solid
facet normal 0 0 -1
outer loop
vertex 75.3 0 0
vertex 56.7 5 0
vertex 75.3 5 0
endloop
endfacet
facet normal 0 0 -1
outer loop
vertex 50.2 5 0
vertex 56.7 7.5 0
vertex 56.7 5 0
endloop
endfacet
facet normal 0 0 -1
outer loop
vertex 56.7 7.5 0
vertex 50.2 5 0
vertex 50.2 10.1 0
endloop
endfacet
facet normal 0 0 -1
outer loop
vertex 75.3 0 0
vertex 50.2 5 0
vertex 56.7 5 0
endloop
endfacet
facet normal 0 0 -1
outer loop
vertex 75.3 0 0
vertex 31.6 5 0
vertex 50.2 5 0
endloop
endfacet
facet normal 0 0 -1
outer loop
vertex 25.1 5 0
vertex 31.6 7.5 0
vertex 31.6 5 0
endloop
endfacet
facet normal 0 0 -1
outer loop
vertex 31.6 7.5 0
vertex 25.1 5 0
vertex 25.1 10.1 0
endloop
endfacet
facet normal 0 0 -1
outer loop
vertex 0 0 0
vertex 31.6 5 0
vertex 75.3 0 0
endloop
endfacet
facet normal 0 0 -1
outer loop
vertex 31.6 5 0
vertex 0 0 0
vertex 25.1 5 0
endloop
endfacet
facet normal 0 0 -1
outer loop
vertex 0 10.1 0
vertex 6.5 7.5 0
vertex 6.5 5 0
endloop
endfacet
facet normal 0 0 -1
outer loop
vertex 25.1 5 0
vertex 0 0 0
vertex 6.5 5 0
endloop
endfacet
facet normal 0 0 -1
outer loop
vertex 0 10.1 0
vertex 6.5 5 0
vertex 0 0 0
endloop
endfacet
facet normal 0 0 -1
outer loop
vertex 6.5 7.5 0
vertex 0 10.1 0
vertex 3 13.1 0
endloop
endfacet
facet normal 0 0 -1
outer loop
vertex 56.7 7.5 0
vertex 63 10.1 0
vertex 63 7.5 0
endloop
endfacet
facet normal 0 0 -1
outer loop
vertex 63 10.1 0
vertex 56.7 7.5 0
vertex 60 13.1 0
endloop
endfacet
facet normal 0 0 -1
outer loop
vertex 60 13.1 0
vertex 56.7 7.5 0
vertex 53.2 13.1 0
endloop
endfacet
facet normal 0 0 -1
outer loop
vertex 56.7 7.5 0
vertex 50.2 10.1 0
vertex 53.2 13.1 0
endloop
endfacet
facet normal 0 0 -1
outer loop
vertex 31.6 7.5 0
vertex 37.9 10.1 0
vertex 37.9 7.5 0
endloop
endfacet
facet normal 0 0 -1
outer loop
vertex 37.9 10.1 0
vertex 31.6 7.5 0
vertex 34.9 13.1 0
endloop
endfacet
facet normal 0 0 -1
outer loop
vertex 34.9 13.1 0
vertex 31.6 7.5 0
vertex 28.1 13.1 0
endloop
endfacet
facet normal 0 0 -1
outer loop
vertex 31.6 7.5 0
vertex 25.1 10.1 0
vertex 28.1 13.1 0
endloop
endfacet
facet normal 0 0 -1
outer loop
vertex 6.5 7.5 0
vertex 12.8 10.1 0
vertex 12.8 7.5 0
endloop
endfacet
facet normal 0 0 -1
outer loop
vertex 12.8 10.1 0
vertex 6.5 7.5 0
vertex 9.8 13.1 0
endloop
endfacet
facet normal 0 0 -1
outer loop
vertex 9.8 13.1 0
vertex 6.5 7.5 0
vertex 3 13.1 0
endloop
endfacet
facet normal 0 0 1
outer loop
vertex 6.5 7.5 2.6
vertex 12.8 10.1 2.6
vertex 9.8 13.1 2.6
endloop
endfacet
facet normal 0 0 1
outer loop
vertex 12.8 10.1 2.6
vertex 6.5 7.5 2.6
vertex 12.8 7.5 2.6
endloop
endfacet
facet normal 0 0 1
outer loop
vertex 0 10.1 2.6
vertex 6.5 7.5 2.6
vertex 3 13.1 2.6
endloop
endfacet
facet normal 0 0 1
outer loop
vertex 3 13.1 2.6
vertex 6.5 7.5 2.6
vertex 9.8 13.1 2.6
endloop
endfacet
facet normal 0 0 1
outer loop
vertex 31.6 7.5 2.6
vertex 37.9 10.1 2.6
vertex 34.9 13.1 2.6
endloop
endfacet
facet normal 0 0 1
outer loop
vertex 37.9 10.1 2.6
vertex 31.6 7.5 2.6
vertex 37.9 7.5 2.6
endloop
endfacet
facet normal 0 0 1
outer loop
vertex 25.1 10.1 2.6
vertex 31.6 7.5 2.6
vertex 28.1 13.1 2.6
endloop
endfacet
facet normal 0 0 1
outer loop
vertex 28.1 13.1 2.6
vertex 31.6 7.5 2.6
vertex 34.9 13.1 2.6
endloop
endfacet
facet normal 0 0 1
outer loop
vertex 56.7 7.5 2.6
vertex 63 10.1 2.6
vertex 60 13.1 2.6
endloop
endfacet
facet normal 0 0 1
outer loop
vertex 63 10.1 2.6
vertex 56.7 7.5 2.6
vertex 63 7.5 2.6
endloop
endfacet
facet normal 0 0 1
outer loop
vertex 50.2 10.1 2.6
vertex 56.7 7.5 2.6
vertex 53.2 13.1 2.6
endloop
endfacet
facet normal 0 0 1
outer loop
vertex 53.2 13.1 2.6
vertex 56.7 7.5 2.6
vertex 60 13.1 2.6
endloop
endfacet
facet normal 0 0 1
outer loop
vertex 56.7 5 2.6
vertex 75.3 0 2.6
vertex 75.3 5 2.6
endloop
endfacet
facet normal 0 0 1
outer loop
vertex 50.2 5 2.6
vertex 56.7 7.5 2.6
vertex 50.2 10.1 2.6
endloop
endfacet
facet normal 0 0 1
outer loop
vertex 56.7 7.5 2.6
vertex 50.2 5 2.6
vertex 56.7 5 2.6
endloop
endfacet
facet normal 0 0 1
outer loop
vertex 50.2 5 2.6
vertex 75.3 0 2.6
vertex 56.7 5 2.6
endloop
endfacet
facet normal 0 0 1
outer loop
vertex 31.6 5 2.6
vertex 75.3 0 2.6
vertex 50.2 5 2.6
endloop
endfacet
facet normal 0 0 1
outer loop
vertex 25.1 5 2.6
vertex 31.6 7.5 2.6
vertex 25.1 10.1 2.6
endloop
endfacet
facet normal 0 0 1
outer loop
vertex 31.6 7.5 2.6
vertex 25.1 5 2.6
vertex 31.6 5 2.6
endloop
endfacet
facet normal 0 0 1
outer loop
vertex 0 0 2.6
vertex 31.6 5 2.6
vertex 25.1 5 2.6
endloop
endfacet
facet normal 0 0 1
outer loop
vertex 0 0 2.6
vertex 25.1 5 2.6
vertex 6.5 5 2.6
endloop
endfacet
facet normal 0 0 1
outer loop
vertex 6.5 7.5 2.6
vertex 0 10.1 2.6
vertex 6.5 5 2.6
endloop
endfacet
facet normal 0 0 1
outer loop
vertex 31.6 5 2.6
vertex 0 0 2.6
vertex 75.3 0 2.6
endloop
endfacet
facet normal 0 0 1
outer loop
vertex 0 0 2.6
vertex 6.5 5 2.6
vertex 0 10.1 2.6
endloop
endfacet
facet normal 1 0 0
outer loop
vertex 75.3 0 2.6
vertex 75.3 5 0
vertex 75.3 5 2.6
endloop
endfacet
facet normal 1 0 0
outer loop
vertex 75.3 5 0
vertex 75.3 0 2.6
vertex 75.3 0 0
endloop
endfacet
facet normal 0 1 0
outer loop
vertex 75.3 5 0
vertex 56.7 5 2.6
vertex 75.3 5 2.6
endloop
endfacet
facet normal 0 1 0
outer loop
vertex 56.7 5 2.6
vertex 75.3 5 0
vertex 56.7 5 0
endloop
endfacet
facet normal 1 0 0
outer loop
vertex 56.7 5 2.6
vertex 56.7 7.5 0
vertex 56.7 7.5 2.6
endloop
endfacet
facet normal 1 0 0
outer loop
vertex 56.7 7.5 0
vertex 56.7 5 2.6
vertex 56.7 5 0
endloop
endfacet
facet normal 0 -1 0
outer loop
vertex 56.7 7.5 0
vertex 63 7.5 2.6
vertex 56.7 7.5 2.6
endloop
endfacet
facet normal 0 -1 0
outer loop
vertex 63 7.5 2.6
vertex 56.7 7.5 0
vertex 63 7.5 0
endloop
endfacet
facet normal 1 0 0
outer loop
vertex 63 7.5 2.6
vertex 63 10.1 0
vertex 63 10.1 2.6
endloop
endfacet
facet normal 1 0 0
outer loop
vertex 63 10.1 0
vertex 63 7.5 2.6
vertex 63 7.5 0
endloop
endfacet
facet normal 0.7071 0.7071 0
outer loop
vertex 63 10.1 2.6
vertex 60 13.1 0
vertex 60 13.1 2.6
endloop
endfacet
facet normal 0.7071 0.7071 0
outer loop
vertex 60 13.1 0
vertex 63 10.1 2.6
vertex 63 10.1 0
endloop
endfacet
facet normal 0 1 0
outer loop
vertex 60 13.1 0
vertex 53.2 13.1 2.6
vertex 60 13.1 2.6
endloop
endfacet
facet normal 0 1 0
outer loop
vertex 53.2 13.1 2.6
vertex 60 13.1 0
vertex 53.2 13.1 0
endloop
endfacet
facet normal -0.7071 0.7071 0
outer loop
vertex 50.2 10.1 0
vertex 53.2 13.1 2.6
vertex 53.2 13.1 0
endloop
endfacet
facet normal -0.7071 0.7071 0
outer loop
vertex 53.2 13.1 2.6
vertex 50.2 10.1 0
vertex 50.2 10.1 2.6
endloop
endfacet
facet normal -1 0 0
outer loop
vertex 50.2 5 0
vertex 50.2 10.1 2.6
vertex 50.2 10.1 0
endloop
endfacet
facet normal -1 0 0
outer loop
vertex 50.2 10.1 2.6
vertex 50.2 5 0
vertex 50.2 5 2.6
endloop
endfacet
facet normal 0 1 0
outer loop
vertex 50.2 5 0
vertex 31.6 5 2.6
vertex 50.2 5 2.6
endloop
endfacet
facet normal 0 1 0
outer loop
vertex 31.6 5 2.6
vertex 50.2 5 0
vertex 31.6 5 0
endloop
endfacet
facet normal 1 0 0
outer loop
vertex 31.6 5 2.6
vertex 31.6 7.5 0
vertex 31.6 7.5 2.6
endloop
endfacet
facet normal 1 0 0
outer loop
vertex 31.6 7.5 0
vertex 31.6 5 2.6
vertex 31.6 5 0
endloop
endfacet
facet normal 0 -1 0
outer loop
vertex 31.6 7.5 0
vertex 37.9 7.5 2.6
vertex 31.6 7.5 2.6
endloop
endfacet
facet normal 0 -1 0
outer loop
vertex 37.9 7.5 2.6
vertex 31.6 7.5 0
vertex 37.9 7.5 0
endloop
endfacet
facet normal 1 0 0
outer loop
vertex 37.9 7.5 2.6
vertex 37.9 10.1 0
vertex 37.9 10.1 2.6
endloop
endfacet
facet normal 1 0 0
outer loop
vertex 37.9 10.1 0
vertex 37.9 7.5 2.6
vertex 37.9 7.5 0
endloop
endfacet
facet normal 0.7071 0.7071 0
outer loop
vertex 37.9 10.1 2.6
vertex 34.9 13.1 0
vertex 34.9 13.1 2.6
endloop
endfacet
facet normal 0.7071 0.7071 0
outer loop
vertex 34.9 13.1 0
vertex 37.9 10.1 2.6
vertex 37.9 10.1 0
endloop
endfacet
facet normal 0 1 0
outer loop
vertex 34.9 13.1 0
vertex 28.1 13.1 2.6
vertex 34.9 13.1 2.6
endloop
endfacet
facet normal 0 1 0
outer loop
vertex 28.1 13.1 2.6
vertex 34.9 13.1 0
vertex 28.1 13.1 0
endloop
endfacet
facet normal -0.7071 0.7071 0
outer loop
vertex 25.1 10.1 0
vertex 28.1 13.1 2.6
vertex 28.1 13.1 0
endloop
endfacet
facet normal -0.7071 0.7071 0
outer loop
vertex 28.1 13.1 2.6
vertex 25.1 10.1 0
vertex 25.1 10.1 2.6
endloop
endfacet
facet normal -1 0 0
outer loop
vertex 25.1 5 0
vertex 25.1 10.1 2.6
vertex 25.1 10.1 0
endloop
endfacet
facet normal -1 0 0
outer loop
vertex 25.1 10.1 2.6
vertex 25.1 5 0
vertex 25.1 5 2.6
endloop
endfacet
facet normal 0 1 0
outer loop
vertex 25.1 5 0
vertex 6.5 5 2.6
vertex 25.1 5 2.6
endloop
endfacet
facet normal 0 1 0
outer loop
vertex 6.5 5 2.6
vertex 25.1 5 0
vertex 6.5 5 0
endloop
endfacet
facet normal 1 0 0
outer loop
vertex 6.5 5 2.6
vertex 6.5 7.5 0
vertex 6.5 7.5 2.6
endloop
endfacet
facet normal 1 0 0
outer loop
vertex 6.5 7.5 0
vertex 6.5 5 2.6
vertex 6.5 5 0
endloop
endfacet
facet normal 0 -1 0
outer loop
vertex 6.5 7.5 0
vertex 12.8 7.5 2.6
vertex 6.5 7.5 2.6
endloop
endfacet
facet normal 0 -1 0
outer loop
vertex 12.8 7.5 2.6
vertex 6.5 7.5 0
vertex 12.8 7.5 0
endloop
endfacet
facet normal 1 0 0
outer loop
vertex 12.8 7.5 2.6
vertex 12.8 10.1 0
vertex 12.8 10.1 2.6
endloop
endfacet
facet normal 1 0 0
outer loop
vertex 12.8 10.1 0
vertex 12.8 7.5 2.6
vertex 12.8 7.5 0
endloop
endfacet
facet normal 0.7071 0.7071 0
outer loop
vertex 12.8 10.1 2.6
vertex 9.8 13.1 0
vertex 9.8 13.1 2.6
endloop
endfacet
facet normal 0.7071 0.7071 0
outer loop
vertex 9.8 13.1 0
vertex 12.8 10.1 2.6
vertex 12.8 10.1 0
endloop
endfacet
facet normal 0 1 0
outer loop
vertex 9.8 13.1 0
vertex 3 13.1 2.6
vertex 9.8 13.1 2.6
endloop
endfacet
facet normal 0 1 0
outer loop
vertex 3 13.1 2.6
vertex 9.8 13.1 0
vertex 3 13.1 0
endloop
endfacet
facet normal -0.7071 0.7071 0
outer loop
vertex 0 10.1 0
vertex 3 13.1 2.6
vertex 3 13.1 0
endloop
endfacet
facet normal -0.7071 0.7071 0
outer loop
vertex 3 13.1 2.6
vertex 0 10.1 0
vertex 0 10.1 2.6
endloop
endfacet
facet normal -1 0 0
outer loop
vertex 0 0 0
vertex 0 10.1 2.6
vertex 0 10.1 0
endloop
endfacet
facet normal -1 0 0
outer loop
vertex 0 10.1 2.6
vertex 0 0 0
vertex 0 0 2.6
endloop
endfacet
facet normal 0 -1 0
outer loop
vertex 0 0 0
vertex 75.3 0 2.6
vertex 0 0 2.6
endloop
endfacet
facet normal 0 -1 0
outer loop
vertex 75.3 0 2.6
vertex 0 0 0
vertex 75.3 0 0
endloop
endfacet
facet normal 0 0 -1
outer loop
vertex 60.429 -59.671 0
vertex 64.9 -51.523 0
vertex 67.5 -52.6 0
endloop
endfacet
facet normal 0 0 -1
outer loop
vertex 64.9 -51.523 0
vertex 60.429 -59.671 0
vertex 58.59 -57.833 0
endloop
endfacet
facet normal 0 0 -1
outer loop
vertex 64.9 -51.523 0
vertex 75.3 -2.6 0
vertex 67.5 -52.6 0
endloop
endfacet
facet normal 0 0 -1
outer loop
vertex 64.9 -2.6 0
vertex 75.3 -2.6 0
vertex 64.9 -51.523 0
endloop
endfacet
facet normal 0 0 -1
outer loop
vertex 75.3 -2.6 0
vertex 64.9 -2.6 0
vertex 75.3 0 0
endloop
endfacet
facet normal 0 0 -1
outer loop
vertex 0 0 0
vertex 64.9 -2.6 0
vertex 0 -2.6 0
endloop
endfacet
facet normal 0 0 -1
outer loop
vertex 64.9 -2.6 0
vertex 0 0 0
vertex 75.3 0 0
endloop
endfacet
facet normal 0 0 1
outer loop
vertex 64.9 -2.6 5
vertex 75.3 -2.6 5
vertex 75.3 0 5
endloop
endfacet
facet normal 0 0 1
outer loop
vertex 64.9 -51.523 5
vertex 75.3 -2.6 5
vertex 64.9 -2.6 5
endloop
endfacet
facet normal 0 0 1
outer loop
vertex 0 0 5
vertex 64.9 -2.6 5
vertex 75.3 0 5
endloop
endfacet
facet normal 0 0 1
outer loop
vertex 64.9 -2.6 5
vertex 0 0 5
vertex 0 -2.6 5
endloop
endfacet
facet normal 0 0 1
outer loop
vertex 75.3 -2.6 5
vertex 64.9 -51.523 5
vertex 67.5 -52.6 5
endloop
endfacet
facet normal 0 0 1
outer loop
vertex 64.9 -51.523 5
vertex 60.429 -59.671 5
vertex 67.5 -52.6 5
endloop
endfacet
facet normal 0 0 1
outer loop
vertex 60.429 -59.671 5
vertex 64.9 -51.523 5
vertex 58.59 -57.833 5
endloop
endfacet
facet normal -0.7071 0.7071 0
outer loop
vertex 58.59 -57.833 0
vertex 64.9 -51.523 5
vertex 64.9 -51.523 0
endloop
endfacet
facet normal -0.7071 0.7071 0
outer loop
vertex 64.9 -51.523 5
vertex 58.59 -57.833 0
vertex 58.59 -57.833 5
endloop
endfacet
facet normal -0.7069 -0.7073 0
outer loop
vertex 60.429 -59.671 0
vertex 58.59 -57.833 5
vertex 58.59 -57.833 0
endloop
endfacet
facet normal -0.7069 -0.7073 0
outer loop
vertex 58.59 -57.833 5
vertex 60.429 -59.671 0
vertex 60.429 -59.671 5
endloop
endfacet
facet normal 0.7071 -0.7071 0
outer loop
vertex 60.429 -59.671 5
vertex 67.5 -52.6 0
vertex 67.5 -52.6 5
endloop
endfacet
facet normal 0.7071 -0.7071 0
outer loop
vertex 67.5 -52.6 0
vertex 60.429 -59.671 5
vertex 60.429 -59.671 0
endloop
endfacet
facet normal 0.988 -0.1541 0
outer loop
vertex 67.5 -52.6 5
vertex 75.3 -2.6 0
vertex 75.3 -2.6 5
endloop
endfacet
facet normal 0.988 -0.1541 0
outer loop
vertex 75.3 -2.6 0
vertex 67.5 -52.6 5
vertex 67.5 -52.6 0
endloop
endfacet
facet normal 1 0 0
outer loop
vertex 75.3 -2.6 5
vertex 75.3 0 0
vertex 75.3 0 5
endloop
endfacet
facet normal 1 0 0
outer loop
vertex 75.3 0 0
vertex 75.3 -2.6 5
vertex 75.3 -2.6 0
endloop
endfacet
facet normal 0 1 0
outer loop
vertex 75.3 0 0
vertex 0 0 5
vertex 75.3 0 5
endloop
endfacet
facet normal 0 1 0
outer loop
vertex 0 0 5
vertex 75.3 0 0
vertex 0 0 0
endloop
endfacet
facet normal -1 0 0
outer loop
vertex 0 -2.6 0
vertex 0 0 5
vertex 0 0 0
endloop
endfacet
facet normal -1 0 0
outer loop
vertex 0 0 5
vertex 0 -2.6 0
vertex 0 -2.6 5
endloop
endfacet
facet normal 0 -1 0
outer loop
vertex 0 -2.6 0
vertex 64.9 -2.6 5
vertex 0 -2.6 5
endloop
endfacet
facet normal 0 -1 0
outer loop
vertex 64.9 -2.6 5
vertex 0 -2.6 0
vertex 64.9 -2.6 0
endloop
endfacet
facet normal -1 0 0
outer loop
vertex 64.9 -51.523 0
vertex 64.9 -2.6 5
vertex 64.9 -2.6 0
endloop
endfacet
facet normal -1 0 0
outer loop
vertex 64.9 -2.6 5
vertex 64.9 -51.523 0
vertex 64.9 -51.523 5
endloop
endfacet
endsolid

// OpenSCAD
//////////////////////////////////////////////////////
// Holder Measurements
//

hook_width = 12.8;
hook_to_hook = 37.9 - hook_width;  // 38.2
hook_gap = 2.5;
hook_length = 5.6 + hook_gap;
hook_notch = 5.6 - 2.6;
hook_arm = 6.5;

hook_thick = 2.6;


//////////////////////////////////////////////////////
// Render!
//

// THE BASE CUBICLE HOOK
linear_extrude(height = hook_thick) three_hooks();


// EXTRA STUFF ATTACHED TO THE HOOK
translate([0,-hook_thick,0])
linear_extrude(height = 5) union()
{
    square([hook_to_hook*3, hook_thick]);

    translate([hook_to_hook*3 - hook_thick*4, 0])
        polygon(points = [ [0, 0],
                           [0, -50],
                           [hook_thick, -50],
                           [hook_thick*4, 0] ],
                path = [ [0:3] ]);

    translate([hook_to_hook*3 - hook_thick*3, -50])
        rotate(135) square([hook_thick, 10]);
}






//////////////////////////////////////////////////////
// The Modules
//

module three_hooks()
{
    base = 5;

    for(i=[0:2])
        translate([hook_to_hook*i, base]) hook();
    square([hook_to_hook*3, base]);
}




module hook()
{
    polygon(points = [ [0, 0],
                       [0, hook_length - hook_notch],
                       [hook_notch, hook_length],
                       [hook_width - hook_notch, hook_length],
                       [hook_width, hook_length - hook_notch],
                       [hook_width, hook_gap],
                       [hook_arm, hook_gap],
                       [hook_arm, 0],
                     ],
             path = [ [0:7] ]);
}
